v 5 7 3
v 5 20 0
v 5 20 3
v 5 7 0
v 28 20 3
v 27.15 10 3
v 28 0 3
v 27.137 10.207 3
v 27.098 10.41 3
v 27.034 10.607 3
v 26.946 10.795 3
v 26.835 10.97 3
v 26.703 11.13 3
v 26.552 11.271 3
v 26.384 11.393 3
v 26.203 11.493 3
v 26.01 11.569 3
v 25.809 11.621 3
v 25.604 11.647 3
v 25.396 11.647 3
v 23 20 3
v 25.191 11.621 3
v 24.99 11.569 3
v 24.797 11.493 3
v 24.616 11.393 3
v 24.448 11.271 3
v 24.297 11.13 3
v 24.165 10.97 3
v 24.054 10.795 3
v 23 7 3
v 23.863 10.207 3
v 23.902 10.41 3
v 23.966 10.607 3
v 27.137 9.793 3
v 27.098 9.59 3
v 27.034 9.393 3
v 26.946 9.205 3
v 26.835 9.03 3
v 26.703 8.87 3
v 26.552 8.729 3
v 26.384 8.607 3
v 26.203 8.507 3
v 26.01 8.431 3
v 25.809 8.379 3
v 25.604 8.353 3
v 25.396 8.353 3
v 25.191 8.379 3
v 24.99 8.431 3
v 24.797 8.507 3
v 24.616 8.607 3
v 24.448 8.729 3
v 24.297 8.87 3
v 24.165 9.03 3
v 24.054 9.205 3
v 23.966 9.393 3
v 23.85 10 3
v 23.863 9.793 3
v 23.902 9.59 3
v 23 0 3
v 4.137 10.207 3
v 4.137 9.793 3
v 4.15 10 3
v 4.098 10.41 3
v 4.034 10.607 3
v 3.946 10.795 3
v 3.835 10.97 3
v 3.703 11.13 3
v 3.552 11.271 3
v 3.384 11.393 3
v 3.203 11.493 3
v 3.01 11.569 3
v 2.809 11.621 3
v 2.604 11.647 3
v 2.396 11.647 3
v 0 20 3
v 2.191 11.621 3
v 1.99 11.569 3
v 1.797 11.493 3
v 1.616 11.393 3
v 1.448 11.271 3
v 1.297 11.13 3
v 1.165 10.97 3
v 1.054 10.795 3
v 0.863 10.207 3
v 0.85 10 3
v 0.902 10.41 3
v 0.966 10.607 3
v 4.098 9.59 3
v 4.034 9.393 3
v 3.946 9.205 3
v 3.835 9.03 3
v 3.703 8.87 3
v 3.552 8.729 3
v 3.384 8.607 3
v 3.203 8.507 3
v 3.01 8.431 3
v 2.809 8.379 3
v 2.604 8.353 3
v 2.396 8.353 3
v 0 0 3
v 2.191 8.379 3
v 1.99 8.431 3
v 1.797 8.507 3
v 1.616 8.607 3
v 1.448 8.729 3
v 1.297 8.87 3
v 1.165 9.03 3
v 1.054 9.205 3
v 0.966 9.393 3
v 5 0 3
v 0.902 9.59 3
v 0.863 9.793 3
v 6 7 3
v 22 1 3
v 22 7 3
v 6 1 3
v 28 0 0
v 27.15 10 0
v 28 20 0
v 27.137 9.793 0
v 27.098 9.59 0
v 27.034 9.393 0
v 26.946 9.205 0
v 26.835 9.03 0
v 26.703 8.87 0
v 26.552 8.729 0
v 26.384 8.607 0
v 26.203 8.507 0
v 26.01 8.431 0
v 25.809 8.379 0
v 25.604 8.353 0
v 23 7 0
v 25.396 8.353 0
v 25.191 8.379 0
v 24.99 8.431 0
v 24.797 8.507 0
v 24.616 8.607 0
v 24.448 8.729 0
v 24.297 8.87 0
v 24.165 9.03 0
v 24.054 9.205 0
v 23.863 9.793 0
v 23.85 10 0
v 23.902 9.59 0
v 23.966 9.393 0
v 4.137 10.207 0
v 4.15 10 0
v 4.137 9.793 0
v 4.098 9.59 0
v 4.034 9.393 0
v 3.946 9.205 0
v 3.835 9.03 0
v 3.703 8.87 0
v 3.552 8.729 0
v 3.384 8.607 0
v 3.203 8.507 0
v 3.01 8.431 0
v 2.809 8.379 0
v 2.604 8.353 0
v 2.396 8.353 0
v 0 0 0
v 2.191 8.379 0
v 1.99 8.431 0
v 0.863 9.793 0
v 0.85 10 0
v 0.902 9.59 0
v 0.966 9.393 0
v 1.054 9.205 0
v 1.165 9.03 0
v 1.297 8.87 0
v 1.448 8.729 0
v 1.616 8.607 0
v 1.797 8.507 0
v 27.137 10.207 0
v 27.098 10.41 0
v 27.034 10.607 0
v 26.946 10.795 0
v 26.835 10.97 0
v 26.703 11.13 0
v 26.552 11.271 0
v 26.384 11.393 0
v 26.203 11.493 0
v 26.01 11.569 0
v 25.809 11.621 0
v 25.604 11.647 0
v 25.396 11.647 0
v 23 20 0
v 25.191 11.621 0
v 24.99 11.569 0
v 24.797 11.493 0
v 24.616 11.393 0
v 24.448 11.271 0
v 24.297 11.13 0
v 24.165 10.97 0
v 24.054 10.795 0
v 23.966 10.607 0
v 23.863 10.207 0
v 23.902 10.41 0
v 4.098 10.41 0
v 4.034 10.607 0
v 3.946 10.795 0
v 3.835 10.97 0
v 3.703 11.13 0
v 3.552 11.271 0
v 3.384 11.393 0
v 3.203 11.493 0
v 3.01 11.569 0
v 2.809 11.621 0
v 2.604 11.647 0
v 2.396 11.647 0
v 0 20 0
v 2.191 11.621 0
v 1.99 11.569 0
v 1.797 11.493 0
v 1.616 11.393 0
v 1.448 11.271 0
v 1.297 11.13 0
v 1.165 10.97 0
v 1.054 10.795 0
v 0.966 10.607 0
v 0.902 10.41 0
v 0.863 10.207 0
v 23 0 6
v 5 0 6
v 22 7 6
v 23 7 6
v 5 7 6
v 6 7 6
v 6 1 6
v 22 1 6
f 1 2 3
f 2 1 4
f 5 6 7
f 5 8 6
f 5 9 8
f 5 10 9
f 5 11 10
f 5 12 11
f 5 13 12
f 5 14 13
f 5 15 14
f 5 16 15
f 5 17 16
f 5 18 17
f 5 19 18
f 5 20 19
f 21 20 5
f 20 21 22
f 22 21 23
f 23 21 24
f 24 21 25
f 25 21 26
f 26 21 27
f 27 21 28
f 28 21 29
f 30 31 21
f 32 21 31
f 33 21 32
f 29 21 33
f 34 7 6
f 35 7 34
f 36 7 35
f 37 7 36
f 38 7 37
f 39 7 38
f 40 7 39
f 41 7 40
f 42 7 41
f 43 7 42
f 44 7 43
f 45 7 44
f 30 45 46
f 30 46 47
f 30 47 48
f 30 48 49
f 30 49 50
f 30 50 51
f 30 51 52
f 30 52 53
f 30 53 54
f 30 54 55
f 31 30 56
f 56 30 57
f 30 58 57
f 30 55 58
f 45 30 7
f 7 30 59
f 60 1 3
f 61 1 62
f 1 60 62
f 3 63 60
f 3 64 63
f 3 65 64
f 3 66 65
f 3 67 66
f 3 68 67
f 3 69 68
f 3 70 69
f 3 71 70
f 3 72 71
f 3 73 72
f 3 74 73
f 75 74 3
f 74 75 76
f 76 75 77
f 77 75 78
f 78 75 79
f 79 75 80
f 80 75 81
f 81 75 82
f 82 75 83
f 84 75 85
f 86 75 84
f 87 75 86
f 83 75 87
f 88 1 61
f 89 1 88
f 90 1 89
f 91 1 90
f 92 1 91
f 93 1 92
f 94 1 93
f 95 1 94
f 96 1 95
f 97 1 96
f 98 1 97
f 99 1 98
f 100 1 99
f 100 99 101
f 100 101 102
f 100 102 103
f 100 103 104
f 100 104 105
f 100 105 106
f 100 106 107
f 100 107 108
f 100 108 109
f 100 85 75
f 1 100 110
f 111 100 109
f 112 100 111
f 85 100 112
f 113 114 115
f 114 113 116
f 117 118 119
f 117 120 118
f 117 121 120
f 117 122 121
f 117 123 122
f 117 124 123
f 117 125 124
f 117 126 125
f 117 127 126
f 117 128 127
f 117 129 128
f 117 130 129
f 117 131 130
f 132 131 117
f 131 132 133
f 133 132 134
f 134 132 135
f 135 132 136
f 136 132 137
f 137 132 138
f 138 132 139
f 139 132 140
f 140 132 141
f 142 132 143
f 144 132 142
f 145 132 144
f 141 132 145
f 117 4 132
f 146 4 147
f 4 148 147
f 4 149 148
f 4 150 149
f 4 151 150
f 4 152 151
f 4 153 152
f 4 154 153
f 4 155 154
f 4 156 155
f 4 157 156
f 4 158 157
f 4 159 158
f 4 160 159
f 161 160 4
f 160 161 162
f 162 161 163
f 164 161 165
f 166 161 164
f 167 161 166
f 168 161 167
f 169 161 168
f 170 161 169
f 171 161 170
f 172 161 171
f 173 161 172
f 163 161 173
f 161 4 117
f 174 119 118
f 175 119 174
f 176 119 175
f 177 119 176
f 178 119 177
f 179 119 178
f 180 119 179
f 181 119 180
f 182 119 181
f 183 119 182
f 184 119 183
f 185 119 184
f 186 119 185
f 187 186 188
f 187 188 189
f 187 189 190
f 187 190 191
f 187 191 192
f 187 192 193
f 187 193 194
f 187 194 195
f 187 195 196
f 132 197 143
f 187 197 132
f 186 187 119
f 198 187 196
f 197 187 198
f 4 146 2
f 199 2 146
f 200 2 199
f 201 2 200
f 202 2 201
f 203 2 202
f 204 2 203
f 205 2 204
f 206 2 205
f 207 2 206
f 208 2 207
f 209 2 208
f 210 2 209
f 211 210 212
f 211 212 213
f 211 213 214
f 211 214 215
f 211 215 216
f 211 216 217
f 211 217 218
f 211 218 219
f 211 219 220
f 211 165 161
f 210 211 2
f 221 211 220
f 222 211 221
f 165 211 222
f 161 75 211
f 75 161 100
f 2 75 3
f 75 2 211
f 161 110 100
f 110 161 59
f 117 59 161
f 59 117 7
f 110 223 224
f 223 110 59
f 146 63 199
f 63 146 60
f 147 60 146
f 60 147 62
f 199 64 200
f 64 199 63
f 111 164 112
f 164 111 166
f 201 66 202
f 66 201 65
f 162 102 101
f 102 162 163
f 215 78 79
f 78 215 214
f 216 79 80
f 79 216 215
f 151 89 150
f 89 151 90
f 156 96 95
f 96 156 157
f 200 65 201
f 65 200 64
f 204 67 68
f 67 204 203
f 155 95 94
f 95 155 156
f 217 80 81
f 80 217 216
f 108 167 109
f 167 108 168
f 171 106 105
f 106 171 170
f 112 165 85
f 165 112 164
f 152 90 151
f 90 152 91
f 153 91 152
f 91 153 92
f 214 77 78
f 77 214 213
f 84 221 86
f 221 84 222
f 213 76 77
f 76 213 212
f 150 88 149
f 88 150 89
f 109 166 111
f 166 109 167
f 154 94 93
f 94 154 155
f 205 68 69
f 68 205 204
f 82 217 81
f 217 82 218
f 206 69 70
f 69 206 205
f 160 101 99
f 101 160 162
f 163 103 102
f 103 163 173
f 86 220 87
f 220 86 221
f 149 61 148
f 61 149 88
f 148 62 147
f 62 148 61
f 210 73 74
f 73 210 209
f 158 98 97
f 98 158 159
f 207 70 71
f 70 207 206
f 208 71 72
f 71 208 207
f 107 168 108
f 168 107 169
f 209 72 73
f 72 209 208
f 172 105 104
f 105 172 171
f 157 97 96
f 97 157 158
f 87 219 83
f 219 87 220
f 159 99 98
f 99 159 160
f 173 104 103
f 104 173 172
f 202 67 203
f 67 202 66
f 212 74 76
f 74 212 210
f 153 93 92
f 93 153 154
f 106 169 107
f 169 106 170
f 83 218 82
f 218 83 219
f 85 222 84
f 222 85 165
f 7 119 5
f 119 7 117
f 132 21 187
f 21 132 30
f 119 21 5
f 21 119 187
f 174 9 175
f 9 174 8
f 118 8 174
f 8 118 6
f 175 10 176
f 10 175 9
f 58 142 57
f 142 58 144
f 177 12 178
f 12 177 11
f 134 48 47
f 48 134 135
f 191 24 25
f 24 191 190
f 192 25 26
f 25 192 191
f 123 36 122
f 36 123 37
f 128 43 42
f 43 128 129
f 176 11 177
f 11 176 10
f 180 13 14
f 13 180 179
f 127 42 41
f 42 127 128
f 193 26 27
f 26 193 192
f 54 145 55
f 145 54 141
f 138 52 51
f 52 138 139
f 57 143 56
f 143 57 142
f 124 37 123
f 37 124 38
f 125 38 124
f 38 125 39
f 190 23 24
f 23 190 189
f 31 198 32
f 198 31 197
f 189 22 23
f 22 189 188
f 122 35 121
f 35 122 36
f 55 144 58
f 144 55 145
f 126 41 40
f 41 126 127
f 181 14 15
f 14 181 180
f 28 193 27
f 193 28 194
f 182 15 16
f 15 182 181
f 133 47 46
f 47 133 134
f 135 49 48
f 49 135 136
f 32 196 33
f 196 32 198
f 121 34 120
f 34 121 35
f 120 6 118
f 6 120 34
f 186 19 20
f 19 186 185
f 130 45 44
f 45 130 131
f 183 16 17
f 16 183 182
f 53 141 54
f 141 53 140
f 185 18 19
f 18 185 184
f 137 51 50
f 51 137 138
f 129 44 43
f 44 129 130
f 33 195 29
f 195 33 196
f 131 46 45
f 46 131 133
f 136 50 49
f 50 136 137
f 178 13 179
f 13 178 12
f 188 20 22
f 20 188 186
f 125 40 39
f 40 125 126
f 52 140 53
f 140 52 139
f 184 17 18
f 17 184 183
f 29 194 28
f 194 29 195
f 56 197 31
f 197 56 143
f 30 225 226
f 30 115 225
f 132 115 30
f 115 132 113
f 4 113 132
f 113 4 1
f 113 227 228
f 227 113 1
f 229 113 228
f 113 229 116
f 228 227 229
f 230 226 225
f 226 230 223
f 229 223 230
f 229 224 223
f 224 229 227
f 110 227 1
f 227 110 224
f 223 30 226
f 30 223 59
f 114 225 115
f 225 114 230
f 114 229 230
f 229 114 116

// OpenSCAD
// Pins for holding the difference potentiometers

$fn = 50;

big_pot_stand_thickness = 5;
big_pot_full_width = 16;
big_pot_stand_length = 20;

module straight_pin() {
   difference() {
      cube([big_pot_stand_thickness*2+big_pot_full_width, big_pot_stand_thickness, 3]);
      translate([big_pot_stand_thickness/2,big_pot_stand_thickness/2,-1])
         cylinder(h=3+2, d=3.3);
      translate([big_pot_stand_thickness*2+big_pot_full_width-big_pot_stand_thickness/2,big_pot_stand_thickness/2,-1])
         cylinder(h=3+2, d=3.3);
   }
}

module u_pin() {
   difference() {
      cube([big_pot_stand_thickness, big_pot_stand_length, 3]);
      translate([big_pot_stand_thickness/2,big_pot_stand_length/2,-1])
         cylinder(h=3+2, d=3.3);
   }
   translate([big_pot_full_width+big_pot_stand_thickness, 0]) {
      difference() {
         cube([big_pot_stand_thickness, big_pot_stand_length, 3]);
         translate([big_pot_stand_thickness/2,big_pot_stand_length/2,-1])
            cylinder(h=3+2, d=3.3);
      }
   }
   cube([big_pot_stand_thickness*2+big_pot_full_width, big_pot_stand_thickness, 3]);
}

module wide_pin() {
   difference() {
      cube([big_pot_stand_thickness, big_pot_stand_length, 3]);
      translate([big_pot_stand_thickness/2,big_pot_stand_length/2,-1])
         cylinder(h=3+2, d=3.3);
   }
   translate([big_pot_full_width+big_pot_stand_thickness+2, 0]) {
      difference() {
         cube([big_pot_stand_thickness, big_pot_stand_length, 3]);
         translate([big_pot_stand_thickness/2,big_pot_stand_length/2,-1])
            cylinder(h=3+2, d=3.3);
      }
   }
   cube([big_pot_stand_thickness*2+big_pot_full_width+2, 7, 3]);
   translate([big_pot_stand_thickness, 0, 0])
      cube([1, 7, 6]);
   translate([big_pot_stand_thickness+big_pot_full_width+1, 0, 0])
      cube([1, 7, 6]);
   translate([big_pot_stand_thickness, 0, 0])
      cube([big_pot_full_width+2, 1, 6]);
}

// straight_pin(); // Make module straight

// u_pin(); // Make module u

wide_pin(); // Make module wide
